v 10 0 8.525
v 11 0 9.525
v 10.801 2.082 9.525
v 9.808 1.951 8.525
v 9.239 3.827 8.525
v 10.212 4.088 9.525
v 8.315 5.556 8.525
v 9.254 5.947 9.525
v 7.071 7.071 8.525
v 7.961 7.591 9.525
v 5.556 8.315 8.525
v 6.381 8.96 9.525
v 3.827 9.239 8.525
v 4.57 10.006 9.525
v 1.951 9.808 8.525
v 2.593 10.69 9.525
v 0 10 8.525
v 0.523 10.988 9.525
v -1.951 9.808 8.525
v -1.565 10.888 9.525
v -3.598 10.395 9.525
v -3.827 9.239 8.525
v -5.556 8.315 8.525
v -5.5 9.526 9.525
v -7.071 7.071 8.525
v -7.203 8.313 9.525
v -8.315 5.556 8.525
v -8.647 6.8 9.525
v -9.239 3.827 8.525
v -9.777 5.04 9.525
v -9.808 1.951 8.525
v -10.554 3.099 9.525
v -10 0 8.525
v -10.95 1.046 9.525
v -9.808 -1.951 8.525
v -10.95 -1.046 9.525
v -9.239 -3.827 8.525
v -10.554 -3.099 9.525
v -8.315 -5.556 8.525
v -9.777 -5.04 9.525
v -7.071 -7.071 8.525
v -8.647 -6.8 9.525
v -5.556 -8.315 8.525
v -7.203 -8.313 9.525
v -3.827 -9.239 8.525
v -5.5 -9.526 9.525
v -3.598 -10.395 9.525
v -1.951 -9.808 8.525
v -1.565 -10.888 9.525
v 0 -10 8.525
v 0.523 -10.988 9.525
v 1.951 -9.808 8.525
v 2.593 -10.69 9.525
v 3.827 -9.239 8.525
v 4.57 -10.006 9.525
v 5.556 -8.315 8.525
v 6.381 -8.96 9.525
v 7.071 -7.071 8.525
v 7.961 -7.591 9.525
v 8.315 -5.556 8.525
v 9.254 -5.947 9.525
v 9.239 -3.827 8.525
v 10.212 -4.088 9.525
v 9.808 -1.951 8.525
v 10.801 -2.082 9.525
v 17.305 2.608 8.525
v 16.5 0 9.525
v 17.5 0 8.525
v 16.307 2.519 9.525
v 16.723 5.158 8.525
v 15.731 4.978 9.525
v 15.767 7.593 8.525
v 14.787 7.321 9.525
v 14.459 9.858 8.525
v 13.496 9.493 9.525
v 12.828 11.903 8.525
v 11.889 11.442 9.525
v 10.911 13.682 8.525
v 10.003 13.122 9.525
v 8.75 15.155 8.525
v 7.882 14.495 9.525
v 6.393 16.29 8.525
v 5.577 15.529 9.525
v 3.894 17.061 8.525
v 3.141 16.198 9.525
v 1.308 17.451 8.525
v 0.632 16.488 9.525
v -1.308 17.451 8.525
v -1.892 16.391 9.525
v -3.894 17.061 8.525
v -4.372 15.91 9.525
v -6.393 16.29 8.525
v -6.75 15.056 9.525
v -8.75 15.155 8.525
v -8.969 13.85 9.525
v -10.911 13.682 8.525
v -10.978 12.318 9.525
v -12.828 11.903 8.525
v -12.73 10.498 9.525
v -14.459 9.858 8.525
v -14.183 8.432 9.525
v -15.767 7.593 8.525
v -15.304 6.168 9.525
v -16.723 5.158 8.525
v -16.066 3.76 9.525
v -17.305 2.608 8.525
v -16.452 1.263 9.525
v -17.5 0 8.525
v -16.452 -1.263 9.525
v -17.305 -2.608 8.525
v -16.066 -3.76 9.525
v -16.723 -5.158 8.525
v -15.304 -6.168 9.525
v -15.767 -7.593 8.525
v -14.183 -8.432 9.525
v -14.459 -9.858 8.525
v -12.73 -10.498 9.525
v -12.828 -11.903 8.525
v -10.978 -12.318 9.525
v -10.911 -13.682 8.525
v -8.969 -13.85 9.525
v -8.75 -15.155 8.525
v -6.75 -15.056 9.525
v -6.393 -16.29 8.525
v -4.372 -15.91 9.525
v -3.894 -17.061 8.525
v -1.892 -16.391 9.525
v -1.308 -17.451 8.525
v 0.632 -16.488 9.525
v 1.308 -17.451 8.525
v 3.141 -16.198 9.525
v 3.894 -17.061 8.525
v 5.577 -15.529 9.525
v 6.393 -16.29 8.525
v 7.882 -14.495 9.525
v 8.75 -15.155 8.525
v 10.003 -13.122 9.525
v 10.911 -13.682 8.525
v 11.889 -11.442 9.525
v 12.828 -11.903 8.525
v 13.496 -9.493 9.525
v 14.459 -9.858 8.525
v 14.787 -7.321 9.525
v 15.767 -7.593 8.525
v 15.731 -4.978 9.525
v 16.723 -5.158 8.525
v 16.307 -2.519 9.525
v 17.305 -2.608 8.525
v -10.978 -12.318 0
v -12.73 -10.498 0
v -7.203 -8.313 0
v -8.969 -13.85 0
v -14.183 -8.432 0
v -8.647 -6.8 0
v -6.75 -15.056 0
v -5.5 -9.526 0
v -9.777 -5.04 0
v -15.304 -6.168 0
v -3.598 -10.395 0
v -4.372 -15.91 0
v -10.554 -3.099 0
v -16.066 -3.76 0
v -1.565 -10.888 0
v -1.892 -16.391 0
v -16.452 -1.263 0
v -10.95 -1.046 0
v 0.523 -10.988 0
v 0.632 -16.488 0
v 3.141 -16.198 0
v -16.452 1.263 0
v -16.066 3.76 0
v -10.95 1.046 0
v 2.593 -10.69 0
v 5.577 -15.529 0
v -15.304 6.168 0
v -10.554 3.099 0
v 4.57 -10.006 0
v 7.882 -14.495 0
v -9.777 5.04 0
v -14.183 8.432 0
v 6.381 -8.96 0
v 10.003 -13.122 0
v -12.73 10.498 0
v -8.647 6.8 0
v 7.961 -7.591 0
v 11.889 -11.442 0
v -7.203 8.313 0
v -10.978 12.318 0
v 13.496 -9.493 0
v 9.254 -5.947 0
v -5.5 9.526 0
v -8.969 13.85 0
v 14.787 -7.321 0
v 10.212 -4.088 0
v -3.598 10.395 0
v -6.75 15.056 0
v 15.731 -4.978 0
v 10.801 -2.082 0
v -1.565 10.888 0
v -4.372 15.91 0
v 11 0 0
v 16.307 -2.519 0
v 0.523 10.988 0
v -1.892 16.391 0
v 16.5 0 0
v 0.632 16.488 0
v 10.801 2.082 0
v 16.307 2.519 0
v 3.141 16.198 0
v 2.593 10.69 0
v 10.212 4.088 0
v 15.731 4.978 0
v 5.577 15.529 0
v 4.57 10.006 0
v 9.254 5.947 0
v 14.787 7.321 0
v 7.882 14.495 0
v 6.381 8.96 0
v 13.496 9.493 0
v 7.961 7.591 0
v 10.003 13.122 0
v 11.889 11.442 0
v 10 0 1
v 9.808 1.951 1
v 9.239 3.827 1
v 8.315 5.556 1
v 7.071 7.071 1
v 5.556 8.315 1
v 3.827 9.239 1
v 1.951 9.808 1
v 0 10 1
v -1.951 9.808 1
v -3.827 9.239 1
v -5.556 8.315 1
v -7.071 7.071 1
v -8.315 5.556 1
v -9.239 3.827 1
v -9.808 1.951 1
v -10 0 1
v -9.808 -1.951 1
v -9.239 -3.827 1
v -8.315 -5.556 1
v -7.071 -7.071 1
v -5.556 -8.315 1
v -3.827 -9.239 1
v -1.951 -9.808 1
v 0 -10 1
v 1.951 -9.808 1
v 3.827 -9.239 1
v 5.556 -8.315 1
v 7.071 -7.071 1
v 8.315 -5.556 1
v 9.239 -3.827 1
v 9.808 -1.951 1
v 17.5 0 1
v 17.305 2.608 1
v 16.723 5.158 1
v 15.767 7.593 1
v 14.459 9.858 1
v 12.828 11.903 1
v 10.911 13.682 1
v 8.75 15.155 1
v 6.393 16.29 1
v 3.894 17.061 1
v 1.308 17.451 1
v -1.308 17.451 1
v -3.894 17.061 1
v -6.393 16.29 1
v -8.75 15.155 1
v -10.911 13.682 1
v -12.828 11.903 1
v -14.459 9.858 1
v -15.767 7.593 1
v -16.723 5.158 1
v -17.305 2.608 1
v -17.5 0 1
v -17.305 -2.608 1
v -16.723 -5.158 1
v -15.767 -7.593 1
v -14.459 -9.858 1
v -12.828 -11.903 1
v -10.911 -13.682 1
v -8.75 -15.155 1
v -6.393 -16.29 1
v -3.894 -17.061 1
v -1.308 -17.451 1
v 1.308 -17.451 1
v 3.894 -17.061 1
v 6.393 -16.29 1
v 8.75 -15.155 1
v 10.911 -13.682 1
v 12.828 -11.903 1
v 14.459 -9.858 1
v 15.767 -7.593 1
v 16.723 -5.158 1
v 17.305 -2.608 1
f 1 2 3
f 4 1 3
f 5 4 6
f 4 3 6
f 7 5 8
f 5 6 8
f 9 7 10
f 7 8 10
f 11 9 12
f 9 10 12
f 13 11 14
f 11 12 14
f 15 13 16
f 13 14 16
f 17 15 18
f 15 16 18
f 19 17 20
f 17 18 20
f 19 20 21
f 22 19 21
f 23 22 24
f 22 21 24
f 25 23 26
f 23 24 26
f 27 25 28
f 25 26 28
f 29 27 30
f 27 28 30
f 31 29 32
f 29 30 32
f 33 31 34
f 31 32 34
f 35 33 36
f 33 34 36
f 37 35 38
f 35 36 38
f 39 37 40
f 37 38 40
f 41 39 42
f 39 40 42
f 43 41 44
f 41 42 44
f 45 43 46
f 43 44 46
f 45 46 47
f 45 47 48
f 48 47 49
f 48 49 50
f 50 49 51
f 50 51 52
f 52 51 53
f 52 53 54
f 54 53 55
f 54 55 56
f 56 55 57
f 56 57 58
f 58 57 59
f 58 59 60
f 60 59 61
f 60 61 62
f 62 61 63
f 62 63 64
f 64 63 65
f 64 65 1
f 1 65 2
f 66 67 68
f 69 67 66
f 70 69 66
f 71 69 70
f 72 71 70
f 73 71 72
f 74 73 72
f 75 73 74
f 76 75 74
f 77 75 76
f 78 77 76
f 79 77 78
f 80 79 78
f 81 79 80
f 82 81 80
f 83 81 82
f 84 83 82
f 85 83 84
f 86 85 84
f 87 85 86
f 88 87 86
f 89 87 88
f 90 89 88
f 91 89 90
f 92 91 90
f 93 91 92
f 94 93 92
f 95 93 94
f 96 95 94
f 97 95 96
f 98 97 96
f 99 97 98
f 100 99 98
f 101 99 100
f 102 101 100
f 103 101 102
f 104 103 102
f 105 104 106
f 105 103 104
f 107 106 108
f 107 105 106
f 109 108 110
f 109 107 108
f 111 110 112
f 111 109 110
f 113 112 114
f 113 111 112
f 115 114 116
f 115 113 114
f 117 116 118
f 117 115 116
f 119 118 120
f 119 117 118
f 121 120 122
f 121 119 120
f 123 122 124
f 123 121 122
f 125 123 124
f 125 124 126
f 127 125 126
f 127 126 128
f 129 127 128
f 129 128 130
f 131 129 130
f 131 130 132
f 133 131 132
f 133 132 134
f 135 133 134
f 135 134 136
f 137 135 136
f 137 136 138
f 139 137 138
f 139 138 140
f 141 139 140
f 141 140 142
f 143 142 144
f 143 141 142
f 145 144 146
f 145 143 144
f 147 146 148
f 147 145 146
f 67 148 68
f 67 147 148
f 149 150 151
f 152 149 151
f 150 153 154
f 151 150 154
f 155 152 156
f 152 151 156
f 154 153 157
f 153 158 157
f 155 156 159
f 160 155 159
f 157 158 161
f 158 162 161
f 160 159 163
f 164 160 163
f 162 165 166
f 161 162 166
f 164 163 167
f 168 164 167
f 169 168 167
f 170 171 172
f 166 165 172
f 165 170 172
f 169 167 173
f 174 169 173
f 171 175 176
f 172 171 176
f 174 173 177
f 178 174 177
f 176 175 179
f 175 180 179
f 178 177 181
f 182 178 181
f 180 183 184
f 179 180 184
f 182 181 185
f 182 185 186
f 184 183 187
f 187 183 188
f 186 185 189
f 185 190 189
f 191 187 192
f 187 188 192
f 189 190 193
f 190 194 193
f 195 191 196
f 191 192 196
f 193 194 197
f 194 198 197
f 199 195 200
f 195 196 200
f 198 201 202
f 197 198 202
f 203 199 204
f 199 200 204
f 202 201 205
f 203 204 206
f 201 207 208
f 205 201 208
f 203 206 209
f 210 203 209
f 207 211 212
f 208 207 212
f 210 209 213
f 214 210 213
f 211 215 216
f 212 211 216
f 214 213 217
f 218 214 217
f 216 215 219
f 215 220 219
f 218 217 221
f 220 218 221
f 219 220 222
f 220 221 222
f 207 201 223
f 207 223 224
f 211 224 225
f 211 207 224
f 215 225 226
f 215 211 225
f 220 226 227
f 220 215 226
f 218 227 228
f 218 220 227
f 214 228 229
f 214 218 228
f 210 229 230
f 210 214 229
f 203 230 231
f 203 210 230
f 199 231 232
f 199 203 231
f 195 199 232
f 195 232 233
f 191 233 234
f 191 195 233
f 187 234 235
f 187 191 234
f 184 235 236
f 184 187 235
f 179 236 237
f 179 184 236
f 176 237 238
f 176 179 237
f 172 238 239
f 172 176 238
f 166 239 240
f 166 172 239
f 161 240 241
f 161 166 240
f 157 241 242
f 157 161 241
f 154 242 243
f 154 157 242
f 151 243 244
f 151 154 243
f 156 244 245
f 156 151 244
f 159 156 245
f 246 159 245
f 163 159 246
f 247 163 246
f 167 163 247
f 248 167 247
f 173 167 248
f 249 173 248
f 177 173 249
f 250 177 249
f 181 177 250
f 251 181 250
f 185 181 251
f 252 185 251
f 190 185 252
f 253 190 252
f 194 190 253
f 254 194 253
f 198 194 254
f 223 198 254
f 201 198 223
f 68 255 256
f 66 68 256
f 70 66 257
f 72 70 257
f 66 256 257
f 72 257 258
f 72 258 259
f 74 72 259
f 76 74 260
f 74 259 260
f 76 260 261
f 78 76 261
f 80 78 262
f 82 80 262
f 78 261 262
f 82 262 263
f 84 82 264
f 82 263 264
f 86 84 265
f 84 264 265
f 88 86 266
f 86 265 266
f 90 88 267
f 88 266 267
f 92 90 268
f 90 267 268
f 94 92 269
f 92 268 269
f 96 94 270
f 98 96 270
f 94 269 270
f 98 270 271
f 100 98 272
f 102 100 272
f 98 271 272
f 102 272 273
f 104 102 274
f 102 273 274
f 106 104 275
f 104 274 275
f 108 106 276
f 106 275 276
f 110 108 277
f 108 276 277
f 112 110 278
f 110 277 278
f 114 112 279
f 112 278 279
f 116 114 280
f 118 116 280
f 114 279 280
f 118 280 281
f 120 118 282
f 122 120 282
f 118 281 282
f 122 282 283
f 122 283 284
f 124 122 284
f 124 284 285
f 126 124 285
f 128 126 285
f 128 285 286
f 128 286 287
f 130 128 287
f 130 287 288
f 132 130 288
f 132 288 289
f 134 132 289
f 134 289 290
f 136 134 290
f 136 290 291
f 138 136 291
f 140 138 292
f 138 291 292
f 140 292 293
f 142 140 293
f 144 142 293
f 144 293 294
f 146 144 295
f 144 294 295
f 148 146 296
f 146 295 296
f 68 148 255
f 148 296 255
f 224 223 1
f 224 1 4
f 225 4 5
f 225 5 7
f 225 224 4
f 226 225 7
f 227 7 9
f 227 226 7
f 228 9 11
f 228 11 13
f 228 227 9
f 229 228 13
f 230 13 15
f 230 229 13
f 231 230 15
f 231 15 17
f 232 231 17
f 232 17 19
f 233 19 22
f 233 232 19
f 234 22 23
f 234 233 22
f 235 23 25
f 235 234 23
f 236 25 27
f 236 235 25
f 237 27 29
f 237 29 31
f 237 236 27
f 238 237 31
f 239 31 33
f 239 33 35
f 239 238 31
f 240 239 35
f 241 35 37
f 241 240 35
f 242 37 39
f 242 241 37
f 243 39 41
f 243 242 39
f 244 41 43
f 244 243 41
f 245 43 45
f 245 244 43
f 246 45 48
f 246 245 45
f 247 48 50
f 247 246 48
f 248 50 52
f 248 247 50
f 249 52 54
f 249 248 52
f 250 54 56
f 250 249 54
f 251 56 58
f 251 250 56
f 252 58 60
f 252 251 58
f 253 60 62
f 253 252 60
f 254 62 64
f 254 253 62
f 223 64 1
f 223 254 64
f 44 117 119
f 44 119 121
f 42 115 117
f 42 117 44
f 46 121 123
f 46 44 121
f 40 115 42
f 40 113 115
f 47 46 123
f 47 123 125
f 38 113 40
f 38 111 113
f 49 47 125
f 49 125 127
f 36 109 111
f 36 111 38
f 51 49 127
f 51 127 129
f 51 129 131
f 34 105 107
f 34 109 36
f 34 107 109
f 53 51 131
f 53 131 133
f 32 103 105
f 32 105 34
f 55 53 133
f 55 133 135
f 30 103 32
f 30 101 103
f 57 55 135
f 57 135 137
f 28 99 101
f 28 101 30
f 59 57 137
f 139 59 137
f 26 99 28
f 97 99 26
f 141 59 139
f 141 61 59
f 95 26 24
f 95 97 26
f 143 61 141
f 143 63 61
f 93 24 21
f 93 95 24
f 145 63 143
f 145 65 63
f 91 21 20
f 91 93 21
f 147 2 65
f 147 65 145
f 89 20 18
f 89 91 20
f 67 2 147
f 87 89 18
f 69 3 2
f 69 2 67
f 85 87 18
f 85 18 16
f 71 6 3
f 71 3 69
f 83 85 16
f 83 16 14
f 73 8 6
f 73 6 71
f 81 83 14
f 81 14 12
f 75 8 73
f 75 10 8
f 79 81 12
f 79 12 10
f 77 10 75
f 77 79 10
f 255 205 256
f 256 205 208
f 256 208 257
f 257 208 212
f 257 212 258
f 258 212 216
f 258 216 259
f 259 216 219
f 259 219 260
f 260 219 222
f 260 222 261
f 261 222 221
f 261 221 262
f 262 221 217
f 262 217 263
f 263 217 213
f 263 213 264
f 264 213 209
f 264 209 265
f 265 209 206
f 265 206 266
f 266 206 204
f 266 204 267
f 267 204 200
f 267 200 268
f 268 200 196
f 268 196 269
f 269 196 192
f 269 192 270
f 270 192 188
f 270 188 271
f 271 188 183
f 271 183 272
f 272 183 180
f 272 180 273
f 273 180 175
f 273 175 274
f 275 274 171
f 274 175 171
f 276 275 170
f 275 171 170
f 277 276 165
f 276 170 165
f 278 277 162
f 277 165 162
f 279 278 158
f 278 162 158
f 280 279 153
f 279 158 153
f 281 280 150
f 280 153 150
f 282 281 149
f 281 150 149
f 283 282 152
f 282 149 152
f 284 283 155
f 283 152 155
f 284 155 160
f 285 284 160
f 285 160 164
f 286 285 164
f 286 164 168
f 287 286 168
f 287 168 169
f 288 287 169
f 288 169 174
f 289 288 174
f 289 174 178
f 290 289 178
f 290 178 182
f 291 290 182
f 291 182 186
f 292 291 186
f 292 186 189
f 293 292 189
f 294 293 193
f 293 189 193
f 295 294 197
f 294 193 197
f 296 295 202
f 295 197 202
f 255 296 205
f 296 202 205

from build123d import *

# Parameters (mm, degrees)
ESBO_O1_R                = 17.5
ESBO_O1_R_2              = 10
RESSALTO_EXTRUS_O1_DEPTH = 9.525
CHANFRO1_SIZE            = 1


with BuildPart() as part:
    # Esboço1 → Ressalto-extrusão1 (new body)
    with BuildSketch(Plane.XY):
        Circle(ESBO_O1_R)
        Circle(ESBO_O1_R_2, mode=Mode.SUBTRACT)
    extrude(amount=RESSALTO_EXTRUS_O1_DEPTH)

    # Chanfro1
    chanfro1_edges = [part.edges().sort_by_distance(p)[0] for p in [
        (-17.5, 0, 0),
        (-17.5, 0, 9.525),
        (-10, 0, 0),
        (-10, 0, 9.525),
    ]]
    chamfer(chanfro1_edges, length=CHANFRO1_SIZE)


solid = part.part
